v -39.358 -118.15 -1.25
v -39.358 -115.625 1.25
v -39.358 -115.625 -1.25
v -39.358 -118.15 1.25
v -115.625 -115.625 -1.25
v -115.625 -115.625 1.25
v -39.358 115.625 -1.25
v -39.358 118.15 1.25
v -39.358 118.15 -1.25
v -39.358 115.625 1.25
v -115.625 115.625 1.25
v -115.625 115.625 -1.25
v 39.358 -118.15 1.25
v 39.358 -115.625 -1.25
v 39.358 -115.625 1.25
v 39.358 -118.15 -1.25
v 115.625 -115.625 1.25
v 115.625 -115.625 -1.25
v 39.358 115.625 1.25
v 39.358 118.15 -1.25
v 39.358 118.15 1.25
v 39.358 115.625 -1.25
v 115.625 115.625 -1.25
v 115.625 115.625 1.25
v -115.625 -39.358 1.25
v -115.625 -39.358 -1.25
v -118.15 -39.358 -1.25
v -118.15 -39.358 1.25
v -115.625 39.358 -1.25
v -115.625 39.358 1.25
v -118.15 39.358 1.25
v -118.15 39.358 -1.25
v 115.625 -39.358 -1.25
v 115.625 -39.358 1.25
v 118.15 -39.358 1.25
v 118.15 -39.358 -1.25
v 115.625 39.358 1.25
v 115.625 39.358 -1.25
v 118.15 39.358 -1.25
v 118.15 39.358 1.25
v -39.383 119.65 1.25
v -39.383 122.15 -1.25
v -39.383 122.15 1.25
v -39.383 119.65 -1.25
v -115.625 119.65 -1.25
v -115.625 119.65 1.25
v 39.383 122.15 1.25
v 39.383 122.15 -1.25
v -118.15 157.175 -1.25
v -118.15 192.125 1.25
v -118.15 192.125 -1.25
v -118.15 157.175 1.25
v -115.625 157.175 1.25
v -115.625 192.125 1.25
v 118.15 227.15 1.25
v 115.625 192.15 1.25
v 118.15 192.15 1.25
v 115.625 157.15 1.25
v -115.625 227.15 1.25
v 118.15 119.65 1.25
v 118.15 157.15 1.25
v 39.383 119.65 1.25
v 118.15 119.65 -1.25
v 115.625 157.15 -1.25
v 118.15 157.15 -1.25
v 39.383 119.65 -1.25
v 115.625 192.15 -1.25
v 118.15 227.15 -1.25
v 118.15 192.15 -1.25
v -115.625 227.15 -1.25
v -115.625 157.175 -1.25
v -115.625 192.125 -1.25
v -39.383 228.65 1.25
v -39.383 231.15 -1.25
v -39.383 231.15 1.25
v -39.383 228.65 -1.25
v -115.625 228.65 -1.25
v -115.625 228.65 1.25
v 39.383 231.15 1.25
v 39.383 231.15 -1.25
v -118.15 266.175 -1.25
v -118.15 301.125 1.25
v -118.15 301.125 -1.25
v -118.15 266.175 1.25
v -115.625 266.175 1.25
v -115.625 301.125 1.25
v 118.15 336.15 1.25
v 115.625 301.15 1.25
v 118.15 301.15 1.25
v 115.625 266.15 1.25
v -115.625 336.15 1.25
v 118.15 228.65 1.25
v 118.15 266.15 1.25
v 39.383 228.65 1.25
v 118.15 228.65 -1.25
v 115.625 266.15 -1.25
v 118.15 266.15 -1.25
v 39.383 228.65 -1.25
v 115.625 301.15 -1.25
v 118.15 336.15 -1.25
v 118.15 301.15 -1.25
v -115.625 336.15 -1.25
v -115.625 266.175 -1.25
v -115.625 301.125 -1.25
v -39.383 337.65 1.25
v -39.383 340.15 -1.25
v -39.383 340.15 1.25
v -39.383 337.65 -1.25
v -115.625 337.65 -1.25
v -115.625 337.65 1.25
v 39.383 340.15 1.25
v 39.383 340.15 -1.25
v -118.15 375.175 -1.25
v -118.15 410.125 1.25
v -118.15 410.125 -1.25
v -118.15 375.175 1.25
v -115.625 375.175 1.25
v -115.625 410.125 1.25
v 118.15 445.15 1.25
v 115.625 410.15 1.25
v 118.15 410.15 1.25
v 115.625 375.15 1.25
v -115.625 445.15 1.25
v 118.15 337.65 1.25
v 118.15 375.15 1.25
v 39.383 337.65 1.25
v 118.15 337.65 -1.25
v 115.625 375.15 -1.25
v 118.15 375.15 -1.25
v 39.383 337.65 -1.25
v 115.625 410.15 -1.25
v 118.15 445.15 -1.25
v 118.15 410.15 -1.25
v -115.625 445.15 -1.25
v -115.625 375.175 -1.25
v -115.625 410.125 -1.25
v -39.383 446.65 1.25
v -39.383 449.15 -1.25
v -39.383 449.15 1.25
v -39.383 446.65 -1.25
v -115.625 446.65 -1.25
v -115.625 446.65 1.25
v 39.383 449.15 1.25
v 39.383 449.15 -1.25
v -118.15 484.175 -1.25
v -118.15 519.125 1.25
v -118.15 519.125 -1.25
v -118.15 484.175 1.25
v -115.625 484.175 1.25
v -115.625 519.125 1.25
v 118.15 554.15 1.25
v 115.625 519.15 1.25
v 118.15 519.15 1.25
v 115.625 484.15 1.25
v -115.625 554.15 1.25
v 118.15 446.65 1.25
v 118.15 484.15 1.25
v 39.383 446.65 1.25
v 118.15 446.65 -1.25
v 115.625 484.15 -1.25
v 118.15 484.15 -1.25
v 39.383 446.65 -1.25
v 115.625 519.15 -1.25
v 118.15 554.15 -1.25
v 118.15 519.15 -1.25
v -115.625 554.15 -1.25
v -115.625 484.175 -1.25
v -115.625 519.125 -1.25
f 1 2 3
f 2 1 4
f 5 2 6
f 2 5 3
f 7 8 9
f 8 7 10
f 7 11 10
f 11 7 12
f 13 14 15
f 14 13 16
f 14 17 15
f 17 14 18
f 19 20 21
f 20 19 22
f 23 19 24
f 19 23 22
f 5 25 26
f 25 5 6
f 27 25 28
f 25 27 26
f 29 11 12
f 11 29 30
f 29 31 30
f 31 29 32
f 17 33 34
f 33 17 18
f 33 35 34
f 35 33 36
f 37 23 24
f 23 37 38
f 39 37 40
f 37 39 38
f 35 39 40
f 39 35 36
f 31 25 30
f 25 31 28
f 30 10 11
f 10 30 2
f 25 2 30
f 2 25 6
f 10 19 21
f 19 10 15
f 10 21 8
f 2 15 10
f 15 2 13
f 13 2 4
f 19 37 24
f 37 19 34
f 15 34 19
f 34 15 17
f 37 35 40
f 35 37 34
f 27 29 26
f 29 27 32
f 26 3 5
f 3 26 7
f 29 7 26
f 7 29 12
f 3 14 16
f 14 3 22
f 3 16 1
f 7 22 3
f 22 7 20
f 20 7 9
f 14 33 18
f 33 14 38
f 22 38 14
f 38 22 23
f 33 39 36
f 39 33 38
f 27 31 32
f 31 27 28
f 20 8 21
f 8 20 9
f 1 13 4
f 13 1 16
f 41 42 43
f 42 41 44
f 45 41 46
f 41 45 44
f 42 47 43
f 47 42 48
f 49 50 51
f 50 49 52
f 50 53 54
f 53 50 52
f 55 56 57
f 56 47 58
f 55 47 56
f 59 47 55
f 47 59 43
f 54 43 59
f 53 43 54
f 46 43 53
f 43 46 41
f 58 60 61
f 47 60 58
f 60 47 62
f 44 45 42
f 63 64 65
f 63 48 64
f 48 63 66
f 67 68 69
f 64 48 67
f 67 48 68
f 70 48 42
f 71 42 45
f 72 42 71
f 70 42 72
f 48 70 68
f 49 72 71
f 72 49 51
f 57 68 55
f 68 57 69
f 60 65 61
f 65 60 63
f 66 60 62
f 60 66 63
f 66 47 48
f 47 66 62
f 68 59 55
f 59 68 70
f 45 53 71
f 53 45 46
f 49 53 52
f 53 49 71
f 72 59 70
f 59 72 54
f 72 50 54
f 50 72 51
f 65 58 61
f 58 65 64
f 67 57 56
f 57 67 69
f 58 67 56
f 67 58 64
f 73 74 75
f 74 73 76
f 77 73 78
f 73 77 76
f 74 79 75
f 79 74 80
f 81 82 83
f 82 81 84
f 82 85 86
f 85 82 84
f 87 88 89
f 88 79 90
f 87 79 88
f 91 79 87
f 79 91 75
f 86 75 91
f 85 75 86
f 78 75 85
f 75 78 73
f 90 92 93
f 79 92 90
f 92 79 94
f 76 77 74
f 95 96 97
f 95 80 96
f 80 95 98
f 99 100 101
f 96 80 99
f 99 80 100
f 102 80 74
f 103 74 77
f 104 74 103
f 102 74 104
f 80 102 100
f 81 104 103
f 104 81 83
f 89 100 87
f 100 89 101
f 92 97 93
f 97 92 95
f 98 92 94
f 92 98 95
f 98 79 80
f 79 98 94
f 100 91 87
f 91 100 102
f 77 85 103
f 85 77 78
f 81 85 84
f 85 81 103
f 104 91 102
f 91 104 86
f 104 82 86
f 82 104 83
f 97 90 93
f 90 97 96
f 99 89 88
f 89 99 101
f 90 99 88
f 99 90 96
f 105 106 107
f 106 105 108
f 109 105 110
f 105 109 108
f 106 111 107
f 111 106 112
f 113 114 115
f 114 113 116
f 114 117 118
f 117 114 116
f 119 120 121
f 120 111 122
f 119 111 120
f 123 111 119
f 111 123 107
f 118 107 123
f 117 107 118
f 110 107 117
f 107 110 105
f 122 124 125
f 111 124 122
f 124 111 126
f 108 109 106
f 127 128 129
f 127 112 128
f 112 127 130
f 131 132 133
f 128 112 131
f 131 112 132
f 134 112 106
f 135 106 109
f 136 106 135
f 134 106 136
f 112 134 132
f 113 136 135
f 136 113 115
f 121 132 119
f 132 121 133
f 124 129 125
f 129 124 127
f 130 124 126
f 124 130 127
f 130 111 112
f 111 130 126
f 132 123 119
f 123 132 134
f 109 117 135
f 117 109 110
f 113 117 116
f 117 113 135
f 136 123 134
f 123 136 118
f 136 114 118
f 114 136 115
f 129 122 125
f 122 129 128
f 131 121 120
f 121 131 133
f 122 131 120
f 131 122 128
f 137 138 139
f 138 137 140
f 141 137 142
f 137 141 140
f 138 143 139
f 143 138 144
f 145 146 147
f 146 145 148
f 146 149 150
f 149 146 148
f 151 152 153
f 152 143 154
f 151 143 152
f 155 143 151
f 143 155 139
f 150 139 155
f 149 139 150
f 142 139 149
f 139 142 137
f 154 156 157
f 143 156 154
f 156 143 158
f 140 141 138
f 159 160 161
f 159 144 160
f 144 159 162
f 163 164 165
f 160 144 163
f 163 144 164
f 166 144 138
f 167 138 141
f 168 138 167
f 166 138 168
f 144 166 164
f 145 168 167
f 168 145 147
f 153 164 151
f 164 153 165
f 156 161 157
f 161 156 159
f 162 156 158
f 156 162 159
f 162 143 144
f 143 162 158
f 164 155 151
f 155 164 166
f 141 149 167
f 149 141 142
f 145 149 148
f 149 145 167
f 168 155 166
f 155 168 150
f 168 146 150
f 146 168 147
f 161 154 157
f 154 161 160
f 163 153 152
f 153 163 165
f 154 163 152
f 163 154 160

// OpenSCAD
// file: side.scad
include <config.scad>;

module side_with_top_noses()
{
    // base
    translate([
        0,
        0,
        size_z/2
        ])
    cube([
        size_x,
        material_z,
        size_z
        ], center=true);

    // top noses
    for (x = [
            -size_x/3,
            +size_x/3
            ])
    {
        translate([
            x,
            0,
            size_z + material_z/2
            ])
        cube([
            size_x/3,
            material_z,
            material_z
            ], center=true);
    }
}

module side()
{
    difference()
    {
        side_with_top_noses();

        // nose cutaway left top
        translate([
            -size_x/2 + material_z/2,
            0,
            size_z/6 + 2*size_z/3 + material_z/2
            ])
        cube([
            material_z + nothing,
            material_z + nothing,
            size_z/3 + material_z + nothing
            ], center=true);

        // nose cutaway left bottom
        translate([
            -size_x/2 + material_z/2,
            0,
            size_z/6
            ])
        cube([
            material_z + nothing,
            material_z + nothing,
            size_z/3 + nothing
            ], center=true);

        // nose cutaway right
        translate([
            size_x/2 - material_z/2,
            0,
            size_z/6 + size_z/3
            ])
        cube([
            material_z + nothing,
            material_z + nothing,
            size_z/3
            ], center=true);
    }
}

module side_translated()
{
    translate([
        0,
        -size_x/2 + material_z/2,
        0
        ])
    side();
}

side();
// file: top.scad
include <config.scad>;

module top()
{
    difference()
    {
        cube([
            size_x,
            size_y,
            material_z
            ], center=true);

        for (x = [
                -size_x/2 + size_x/6,
                +size_x/2 - size_x/6
                ])
            for (y = [
                    -size_y/2 + material_z/2,
                    +size_y/2 - material_z/2
                    ])
            {
                translate([
                    x,
                    y,
                    0
                    ])
                cube([
                    size_x/3 + nothing,
                    material_z + nothing,
                    material_z + nothing
                    ], center=true);
            }

        for (x = [
                -size_x/2 + material_z/2,
                +size_x/2 - material_z/2
                ])
            for (y = [
                    -size_y/3,
                    +size_y/3
                    ])
            {
                translate([
                    x,
                    y,
                    0
                    ])
                cube([
                    material_z + nothing,
                    size_y/3 + nothing,
                    material_z + nothing
                    ], center=true);
            }
    }
}

top();
// file: config.scad
// all measures in millimeters

// material to cut the model parts from
material_z = 2.5;
//material_z = 3;

// size of the shield walls to fit inside the container
size_x = 240.5 - 4.2;
size_y = size_x;
size_z = 105;
nothing = 0.05;

/*
size_x = 50;
size_y = size_x;
size_z = size_x/2.4;
nothing = 0;
*/
// main file
include <config.scad>;
use <top.scad>;
use <side.scad>;

module side_planar()
{
    rotate([
        90,
        0,
        0
        ])
    side();
}

module parts()
{
    top();

    space = 4;
    for (i=[0:3])
    {
        translate([
            0,
            size_y/2 + size_z + (i+1)*space + i*size_z,
            0
            ])
        side_planar();
    }
}

parts();
